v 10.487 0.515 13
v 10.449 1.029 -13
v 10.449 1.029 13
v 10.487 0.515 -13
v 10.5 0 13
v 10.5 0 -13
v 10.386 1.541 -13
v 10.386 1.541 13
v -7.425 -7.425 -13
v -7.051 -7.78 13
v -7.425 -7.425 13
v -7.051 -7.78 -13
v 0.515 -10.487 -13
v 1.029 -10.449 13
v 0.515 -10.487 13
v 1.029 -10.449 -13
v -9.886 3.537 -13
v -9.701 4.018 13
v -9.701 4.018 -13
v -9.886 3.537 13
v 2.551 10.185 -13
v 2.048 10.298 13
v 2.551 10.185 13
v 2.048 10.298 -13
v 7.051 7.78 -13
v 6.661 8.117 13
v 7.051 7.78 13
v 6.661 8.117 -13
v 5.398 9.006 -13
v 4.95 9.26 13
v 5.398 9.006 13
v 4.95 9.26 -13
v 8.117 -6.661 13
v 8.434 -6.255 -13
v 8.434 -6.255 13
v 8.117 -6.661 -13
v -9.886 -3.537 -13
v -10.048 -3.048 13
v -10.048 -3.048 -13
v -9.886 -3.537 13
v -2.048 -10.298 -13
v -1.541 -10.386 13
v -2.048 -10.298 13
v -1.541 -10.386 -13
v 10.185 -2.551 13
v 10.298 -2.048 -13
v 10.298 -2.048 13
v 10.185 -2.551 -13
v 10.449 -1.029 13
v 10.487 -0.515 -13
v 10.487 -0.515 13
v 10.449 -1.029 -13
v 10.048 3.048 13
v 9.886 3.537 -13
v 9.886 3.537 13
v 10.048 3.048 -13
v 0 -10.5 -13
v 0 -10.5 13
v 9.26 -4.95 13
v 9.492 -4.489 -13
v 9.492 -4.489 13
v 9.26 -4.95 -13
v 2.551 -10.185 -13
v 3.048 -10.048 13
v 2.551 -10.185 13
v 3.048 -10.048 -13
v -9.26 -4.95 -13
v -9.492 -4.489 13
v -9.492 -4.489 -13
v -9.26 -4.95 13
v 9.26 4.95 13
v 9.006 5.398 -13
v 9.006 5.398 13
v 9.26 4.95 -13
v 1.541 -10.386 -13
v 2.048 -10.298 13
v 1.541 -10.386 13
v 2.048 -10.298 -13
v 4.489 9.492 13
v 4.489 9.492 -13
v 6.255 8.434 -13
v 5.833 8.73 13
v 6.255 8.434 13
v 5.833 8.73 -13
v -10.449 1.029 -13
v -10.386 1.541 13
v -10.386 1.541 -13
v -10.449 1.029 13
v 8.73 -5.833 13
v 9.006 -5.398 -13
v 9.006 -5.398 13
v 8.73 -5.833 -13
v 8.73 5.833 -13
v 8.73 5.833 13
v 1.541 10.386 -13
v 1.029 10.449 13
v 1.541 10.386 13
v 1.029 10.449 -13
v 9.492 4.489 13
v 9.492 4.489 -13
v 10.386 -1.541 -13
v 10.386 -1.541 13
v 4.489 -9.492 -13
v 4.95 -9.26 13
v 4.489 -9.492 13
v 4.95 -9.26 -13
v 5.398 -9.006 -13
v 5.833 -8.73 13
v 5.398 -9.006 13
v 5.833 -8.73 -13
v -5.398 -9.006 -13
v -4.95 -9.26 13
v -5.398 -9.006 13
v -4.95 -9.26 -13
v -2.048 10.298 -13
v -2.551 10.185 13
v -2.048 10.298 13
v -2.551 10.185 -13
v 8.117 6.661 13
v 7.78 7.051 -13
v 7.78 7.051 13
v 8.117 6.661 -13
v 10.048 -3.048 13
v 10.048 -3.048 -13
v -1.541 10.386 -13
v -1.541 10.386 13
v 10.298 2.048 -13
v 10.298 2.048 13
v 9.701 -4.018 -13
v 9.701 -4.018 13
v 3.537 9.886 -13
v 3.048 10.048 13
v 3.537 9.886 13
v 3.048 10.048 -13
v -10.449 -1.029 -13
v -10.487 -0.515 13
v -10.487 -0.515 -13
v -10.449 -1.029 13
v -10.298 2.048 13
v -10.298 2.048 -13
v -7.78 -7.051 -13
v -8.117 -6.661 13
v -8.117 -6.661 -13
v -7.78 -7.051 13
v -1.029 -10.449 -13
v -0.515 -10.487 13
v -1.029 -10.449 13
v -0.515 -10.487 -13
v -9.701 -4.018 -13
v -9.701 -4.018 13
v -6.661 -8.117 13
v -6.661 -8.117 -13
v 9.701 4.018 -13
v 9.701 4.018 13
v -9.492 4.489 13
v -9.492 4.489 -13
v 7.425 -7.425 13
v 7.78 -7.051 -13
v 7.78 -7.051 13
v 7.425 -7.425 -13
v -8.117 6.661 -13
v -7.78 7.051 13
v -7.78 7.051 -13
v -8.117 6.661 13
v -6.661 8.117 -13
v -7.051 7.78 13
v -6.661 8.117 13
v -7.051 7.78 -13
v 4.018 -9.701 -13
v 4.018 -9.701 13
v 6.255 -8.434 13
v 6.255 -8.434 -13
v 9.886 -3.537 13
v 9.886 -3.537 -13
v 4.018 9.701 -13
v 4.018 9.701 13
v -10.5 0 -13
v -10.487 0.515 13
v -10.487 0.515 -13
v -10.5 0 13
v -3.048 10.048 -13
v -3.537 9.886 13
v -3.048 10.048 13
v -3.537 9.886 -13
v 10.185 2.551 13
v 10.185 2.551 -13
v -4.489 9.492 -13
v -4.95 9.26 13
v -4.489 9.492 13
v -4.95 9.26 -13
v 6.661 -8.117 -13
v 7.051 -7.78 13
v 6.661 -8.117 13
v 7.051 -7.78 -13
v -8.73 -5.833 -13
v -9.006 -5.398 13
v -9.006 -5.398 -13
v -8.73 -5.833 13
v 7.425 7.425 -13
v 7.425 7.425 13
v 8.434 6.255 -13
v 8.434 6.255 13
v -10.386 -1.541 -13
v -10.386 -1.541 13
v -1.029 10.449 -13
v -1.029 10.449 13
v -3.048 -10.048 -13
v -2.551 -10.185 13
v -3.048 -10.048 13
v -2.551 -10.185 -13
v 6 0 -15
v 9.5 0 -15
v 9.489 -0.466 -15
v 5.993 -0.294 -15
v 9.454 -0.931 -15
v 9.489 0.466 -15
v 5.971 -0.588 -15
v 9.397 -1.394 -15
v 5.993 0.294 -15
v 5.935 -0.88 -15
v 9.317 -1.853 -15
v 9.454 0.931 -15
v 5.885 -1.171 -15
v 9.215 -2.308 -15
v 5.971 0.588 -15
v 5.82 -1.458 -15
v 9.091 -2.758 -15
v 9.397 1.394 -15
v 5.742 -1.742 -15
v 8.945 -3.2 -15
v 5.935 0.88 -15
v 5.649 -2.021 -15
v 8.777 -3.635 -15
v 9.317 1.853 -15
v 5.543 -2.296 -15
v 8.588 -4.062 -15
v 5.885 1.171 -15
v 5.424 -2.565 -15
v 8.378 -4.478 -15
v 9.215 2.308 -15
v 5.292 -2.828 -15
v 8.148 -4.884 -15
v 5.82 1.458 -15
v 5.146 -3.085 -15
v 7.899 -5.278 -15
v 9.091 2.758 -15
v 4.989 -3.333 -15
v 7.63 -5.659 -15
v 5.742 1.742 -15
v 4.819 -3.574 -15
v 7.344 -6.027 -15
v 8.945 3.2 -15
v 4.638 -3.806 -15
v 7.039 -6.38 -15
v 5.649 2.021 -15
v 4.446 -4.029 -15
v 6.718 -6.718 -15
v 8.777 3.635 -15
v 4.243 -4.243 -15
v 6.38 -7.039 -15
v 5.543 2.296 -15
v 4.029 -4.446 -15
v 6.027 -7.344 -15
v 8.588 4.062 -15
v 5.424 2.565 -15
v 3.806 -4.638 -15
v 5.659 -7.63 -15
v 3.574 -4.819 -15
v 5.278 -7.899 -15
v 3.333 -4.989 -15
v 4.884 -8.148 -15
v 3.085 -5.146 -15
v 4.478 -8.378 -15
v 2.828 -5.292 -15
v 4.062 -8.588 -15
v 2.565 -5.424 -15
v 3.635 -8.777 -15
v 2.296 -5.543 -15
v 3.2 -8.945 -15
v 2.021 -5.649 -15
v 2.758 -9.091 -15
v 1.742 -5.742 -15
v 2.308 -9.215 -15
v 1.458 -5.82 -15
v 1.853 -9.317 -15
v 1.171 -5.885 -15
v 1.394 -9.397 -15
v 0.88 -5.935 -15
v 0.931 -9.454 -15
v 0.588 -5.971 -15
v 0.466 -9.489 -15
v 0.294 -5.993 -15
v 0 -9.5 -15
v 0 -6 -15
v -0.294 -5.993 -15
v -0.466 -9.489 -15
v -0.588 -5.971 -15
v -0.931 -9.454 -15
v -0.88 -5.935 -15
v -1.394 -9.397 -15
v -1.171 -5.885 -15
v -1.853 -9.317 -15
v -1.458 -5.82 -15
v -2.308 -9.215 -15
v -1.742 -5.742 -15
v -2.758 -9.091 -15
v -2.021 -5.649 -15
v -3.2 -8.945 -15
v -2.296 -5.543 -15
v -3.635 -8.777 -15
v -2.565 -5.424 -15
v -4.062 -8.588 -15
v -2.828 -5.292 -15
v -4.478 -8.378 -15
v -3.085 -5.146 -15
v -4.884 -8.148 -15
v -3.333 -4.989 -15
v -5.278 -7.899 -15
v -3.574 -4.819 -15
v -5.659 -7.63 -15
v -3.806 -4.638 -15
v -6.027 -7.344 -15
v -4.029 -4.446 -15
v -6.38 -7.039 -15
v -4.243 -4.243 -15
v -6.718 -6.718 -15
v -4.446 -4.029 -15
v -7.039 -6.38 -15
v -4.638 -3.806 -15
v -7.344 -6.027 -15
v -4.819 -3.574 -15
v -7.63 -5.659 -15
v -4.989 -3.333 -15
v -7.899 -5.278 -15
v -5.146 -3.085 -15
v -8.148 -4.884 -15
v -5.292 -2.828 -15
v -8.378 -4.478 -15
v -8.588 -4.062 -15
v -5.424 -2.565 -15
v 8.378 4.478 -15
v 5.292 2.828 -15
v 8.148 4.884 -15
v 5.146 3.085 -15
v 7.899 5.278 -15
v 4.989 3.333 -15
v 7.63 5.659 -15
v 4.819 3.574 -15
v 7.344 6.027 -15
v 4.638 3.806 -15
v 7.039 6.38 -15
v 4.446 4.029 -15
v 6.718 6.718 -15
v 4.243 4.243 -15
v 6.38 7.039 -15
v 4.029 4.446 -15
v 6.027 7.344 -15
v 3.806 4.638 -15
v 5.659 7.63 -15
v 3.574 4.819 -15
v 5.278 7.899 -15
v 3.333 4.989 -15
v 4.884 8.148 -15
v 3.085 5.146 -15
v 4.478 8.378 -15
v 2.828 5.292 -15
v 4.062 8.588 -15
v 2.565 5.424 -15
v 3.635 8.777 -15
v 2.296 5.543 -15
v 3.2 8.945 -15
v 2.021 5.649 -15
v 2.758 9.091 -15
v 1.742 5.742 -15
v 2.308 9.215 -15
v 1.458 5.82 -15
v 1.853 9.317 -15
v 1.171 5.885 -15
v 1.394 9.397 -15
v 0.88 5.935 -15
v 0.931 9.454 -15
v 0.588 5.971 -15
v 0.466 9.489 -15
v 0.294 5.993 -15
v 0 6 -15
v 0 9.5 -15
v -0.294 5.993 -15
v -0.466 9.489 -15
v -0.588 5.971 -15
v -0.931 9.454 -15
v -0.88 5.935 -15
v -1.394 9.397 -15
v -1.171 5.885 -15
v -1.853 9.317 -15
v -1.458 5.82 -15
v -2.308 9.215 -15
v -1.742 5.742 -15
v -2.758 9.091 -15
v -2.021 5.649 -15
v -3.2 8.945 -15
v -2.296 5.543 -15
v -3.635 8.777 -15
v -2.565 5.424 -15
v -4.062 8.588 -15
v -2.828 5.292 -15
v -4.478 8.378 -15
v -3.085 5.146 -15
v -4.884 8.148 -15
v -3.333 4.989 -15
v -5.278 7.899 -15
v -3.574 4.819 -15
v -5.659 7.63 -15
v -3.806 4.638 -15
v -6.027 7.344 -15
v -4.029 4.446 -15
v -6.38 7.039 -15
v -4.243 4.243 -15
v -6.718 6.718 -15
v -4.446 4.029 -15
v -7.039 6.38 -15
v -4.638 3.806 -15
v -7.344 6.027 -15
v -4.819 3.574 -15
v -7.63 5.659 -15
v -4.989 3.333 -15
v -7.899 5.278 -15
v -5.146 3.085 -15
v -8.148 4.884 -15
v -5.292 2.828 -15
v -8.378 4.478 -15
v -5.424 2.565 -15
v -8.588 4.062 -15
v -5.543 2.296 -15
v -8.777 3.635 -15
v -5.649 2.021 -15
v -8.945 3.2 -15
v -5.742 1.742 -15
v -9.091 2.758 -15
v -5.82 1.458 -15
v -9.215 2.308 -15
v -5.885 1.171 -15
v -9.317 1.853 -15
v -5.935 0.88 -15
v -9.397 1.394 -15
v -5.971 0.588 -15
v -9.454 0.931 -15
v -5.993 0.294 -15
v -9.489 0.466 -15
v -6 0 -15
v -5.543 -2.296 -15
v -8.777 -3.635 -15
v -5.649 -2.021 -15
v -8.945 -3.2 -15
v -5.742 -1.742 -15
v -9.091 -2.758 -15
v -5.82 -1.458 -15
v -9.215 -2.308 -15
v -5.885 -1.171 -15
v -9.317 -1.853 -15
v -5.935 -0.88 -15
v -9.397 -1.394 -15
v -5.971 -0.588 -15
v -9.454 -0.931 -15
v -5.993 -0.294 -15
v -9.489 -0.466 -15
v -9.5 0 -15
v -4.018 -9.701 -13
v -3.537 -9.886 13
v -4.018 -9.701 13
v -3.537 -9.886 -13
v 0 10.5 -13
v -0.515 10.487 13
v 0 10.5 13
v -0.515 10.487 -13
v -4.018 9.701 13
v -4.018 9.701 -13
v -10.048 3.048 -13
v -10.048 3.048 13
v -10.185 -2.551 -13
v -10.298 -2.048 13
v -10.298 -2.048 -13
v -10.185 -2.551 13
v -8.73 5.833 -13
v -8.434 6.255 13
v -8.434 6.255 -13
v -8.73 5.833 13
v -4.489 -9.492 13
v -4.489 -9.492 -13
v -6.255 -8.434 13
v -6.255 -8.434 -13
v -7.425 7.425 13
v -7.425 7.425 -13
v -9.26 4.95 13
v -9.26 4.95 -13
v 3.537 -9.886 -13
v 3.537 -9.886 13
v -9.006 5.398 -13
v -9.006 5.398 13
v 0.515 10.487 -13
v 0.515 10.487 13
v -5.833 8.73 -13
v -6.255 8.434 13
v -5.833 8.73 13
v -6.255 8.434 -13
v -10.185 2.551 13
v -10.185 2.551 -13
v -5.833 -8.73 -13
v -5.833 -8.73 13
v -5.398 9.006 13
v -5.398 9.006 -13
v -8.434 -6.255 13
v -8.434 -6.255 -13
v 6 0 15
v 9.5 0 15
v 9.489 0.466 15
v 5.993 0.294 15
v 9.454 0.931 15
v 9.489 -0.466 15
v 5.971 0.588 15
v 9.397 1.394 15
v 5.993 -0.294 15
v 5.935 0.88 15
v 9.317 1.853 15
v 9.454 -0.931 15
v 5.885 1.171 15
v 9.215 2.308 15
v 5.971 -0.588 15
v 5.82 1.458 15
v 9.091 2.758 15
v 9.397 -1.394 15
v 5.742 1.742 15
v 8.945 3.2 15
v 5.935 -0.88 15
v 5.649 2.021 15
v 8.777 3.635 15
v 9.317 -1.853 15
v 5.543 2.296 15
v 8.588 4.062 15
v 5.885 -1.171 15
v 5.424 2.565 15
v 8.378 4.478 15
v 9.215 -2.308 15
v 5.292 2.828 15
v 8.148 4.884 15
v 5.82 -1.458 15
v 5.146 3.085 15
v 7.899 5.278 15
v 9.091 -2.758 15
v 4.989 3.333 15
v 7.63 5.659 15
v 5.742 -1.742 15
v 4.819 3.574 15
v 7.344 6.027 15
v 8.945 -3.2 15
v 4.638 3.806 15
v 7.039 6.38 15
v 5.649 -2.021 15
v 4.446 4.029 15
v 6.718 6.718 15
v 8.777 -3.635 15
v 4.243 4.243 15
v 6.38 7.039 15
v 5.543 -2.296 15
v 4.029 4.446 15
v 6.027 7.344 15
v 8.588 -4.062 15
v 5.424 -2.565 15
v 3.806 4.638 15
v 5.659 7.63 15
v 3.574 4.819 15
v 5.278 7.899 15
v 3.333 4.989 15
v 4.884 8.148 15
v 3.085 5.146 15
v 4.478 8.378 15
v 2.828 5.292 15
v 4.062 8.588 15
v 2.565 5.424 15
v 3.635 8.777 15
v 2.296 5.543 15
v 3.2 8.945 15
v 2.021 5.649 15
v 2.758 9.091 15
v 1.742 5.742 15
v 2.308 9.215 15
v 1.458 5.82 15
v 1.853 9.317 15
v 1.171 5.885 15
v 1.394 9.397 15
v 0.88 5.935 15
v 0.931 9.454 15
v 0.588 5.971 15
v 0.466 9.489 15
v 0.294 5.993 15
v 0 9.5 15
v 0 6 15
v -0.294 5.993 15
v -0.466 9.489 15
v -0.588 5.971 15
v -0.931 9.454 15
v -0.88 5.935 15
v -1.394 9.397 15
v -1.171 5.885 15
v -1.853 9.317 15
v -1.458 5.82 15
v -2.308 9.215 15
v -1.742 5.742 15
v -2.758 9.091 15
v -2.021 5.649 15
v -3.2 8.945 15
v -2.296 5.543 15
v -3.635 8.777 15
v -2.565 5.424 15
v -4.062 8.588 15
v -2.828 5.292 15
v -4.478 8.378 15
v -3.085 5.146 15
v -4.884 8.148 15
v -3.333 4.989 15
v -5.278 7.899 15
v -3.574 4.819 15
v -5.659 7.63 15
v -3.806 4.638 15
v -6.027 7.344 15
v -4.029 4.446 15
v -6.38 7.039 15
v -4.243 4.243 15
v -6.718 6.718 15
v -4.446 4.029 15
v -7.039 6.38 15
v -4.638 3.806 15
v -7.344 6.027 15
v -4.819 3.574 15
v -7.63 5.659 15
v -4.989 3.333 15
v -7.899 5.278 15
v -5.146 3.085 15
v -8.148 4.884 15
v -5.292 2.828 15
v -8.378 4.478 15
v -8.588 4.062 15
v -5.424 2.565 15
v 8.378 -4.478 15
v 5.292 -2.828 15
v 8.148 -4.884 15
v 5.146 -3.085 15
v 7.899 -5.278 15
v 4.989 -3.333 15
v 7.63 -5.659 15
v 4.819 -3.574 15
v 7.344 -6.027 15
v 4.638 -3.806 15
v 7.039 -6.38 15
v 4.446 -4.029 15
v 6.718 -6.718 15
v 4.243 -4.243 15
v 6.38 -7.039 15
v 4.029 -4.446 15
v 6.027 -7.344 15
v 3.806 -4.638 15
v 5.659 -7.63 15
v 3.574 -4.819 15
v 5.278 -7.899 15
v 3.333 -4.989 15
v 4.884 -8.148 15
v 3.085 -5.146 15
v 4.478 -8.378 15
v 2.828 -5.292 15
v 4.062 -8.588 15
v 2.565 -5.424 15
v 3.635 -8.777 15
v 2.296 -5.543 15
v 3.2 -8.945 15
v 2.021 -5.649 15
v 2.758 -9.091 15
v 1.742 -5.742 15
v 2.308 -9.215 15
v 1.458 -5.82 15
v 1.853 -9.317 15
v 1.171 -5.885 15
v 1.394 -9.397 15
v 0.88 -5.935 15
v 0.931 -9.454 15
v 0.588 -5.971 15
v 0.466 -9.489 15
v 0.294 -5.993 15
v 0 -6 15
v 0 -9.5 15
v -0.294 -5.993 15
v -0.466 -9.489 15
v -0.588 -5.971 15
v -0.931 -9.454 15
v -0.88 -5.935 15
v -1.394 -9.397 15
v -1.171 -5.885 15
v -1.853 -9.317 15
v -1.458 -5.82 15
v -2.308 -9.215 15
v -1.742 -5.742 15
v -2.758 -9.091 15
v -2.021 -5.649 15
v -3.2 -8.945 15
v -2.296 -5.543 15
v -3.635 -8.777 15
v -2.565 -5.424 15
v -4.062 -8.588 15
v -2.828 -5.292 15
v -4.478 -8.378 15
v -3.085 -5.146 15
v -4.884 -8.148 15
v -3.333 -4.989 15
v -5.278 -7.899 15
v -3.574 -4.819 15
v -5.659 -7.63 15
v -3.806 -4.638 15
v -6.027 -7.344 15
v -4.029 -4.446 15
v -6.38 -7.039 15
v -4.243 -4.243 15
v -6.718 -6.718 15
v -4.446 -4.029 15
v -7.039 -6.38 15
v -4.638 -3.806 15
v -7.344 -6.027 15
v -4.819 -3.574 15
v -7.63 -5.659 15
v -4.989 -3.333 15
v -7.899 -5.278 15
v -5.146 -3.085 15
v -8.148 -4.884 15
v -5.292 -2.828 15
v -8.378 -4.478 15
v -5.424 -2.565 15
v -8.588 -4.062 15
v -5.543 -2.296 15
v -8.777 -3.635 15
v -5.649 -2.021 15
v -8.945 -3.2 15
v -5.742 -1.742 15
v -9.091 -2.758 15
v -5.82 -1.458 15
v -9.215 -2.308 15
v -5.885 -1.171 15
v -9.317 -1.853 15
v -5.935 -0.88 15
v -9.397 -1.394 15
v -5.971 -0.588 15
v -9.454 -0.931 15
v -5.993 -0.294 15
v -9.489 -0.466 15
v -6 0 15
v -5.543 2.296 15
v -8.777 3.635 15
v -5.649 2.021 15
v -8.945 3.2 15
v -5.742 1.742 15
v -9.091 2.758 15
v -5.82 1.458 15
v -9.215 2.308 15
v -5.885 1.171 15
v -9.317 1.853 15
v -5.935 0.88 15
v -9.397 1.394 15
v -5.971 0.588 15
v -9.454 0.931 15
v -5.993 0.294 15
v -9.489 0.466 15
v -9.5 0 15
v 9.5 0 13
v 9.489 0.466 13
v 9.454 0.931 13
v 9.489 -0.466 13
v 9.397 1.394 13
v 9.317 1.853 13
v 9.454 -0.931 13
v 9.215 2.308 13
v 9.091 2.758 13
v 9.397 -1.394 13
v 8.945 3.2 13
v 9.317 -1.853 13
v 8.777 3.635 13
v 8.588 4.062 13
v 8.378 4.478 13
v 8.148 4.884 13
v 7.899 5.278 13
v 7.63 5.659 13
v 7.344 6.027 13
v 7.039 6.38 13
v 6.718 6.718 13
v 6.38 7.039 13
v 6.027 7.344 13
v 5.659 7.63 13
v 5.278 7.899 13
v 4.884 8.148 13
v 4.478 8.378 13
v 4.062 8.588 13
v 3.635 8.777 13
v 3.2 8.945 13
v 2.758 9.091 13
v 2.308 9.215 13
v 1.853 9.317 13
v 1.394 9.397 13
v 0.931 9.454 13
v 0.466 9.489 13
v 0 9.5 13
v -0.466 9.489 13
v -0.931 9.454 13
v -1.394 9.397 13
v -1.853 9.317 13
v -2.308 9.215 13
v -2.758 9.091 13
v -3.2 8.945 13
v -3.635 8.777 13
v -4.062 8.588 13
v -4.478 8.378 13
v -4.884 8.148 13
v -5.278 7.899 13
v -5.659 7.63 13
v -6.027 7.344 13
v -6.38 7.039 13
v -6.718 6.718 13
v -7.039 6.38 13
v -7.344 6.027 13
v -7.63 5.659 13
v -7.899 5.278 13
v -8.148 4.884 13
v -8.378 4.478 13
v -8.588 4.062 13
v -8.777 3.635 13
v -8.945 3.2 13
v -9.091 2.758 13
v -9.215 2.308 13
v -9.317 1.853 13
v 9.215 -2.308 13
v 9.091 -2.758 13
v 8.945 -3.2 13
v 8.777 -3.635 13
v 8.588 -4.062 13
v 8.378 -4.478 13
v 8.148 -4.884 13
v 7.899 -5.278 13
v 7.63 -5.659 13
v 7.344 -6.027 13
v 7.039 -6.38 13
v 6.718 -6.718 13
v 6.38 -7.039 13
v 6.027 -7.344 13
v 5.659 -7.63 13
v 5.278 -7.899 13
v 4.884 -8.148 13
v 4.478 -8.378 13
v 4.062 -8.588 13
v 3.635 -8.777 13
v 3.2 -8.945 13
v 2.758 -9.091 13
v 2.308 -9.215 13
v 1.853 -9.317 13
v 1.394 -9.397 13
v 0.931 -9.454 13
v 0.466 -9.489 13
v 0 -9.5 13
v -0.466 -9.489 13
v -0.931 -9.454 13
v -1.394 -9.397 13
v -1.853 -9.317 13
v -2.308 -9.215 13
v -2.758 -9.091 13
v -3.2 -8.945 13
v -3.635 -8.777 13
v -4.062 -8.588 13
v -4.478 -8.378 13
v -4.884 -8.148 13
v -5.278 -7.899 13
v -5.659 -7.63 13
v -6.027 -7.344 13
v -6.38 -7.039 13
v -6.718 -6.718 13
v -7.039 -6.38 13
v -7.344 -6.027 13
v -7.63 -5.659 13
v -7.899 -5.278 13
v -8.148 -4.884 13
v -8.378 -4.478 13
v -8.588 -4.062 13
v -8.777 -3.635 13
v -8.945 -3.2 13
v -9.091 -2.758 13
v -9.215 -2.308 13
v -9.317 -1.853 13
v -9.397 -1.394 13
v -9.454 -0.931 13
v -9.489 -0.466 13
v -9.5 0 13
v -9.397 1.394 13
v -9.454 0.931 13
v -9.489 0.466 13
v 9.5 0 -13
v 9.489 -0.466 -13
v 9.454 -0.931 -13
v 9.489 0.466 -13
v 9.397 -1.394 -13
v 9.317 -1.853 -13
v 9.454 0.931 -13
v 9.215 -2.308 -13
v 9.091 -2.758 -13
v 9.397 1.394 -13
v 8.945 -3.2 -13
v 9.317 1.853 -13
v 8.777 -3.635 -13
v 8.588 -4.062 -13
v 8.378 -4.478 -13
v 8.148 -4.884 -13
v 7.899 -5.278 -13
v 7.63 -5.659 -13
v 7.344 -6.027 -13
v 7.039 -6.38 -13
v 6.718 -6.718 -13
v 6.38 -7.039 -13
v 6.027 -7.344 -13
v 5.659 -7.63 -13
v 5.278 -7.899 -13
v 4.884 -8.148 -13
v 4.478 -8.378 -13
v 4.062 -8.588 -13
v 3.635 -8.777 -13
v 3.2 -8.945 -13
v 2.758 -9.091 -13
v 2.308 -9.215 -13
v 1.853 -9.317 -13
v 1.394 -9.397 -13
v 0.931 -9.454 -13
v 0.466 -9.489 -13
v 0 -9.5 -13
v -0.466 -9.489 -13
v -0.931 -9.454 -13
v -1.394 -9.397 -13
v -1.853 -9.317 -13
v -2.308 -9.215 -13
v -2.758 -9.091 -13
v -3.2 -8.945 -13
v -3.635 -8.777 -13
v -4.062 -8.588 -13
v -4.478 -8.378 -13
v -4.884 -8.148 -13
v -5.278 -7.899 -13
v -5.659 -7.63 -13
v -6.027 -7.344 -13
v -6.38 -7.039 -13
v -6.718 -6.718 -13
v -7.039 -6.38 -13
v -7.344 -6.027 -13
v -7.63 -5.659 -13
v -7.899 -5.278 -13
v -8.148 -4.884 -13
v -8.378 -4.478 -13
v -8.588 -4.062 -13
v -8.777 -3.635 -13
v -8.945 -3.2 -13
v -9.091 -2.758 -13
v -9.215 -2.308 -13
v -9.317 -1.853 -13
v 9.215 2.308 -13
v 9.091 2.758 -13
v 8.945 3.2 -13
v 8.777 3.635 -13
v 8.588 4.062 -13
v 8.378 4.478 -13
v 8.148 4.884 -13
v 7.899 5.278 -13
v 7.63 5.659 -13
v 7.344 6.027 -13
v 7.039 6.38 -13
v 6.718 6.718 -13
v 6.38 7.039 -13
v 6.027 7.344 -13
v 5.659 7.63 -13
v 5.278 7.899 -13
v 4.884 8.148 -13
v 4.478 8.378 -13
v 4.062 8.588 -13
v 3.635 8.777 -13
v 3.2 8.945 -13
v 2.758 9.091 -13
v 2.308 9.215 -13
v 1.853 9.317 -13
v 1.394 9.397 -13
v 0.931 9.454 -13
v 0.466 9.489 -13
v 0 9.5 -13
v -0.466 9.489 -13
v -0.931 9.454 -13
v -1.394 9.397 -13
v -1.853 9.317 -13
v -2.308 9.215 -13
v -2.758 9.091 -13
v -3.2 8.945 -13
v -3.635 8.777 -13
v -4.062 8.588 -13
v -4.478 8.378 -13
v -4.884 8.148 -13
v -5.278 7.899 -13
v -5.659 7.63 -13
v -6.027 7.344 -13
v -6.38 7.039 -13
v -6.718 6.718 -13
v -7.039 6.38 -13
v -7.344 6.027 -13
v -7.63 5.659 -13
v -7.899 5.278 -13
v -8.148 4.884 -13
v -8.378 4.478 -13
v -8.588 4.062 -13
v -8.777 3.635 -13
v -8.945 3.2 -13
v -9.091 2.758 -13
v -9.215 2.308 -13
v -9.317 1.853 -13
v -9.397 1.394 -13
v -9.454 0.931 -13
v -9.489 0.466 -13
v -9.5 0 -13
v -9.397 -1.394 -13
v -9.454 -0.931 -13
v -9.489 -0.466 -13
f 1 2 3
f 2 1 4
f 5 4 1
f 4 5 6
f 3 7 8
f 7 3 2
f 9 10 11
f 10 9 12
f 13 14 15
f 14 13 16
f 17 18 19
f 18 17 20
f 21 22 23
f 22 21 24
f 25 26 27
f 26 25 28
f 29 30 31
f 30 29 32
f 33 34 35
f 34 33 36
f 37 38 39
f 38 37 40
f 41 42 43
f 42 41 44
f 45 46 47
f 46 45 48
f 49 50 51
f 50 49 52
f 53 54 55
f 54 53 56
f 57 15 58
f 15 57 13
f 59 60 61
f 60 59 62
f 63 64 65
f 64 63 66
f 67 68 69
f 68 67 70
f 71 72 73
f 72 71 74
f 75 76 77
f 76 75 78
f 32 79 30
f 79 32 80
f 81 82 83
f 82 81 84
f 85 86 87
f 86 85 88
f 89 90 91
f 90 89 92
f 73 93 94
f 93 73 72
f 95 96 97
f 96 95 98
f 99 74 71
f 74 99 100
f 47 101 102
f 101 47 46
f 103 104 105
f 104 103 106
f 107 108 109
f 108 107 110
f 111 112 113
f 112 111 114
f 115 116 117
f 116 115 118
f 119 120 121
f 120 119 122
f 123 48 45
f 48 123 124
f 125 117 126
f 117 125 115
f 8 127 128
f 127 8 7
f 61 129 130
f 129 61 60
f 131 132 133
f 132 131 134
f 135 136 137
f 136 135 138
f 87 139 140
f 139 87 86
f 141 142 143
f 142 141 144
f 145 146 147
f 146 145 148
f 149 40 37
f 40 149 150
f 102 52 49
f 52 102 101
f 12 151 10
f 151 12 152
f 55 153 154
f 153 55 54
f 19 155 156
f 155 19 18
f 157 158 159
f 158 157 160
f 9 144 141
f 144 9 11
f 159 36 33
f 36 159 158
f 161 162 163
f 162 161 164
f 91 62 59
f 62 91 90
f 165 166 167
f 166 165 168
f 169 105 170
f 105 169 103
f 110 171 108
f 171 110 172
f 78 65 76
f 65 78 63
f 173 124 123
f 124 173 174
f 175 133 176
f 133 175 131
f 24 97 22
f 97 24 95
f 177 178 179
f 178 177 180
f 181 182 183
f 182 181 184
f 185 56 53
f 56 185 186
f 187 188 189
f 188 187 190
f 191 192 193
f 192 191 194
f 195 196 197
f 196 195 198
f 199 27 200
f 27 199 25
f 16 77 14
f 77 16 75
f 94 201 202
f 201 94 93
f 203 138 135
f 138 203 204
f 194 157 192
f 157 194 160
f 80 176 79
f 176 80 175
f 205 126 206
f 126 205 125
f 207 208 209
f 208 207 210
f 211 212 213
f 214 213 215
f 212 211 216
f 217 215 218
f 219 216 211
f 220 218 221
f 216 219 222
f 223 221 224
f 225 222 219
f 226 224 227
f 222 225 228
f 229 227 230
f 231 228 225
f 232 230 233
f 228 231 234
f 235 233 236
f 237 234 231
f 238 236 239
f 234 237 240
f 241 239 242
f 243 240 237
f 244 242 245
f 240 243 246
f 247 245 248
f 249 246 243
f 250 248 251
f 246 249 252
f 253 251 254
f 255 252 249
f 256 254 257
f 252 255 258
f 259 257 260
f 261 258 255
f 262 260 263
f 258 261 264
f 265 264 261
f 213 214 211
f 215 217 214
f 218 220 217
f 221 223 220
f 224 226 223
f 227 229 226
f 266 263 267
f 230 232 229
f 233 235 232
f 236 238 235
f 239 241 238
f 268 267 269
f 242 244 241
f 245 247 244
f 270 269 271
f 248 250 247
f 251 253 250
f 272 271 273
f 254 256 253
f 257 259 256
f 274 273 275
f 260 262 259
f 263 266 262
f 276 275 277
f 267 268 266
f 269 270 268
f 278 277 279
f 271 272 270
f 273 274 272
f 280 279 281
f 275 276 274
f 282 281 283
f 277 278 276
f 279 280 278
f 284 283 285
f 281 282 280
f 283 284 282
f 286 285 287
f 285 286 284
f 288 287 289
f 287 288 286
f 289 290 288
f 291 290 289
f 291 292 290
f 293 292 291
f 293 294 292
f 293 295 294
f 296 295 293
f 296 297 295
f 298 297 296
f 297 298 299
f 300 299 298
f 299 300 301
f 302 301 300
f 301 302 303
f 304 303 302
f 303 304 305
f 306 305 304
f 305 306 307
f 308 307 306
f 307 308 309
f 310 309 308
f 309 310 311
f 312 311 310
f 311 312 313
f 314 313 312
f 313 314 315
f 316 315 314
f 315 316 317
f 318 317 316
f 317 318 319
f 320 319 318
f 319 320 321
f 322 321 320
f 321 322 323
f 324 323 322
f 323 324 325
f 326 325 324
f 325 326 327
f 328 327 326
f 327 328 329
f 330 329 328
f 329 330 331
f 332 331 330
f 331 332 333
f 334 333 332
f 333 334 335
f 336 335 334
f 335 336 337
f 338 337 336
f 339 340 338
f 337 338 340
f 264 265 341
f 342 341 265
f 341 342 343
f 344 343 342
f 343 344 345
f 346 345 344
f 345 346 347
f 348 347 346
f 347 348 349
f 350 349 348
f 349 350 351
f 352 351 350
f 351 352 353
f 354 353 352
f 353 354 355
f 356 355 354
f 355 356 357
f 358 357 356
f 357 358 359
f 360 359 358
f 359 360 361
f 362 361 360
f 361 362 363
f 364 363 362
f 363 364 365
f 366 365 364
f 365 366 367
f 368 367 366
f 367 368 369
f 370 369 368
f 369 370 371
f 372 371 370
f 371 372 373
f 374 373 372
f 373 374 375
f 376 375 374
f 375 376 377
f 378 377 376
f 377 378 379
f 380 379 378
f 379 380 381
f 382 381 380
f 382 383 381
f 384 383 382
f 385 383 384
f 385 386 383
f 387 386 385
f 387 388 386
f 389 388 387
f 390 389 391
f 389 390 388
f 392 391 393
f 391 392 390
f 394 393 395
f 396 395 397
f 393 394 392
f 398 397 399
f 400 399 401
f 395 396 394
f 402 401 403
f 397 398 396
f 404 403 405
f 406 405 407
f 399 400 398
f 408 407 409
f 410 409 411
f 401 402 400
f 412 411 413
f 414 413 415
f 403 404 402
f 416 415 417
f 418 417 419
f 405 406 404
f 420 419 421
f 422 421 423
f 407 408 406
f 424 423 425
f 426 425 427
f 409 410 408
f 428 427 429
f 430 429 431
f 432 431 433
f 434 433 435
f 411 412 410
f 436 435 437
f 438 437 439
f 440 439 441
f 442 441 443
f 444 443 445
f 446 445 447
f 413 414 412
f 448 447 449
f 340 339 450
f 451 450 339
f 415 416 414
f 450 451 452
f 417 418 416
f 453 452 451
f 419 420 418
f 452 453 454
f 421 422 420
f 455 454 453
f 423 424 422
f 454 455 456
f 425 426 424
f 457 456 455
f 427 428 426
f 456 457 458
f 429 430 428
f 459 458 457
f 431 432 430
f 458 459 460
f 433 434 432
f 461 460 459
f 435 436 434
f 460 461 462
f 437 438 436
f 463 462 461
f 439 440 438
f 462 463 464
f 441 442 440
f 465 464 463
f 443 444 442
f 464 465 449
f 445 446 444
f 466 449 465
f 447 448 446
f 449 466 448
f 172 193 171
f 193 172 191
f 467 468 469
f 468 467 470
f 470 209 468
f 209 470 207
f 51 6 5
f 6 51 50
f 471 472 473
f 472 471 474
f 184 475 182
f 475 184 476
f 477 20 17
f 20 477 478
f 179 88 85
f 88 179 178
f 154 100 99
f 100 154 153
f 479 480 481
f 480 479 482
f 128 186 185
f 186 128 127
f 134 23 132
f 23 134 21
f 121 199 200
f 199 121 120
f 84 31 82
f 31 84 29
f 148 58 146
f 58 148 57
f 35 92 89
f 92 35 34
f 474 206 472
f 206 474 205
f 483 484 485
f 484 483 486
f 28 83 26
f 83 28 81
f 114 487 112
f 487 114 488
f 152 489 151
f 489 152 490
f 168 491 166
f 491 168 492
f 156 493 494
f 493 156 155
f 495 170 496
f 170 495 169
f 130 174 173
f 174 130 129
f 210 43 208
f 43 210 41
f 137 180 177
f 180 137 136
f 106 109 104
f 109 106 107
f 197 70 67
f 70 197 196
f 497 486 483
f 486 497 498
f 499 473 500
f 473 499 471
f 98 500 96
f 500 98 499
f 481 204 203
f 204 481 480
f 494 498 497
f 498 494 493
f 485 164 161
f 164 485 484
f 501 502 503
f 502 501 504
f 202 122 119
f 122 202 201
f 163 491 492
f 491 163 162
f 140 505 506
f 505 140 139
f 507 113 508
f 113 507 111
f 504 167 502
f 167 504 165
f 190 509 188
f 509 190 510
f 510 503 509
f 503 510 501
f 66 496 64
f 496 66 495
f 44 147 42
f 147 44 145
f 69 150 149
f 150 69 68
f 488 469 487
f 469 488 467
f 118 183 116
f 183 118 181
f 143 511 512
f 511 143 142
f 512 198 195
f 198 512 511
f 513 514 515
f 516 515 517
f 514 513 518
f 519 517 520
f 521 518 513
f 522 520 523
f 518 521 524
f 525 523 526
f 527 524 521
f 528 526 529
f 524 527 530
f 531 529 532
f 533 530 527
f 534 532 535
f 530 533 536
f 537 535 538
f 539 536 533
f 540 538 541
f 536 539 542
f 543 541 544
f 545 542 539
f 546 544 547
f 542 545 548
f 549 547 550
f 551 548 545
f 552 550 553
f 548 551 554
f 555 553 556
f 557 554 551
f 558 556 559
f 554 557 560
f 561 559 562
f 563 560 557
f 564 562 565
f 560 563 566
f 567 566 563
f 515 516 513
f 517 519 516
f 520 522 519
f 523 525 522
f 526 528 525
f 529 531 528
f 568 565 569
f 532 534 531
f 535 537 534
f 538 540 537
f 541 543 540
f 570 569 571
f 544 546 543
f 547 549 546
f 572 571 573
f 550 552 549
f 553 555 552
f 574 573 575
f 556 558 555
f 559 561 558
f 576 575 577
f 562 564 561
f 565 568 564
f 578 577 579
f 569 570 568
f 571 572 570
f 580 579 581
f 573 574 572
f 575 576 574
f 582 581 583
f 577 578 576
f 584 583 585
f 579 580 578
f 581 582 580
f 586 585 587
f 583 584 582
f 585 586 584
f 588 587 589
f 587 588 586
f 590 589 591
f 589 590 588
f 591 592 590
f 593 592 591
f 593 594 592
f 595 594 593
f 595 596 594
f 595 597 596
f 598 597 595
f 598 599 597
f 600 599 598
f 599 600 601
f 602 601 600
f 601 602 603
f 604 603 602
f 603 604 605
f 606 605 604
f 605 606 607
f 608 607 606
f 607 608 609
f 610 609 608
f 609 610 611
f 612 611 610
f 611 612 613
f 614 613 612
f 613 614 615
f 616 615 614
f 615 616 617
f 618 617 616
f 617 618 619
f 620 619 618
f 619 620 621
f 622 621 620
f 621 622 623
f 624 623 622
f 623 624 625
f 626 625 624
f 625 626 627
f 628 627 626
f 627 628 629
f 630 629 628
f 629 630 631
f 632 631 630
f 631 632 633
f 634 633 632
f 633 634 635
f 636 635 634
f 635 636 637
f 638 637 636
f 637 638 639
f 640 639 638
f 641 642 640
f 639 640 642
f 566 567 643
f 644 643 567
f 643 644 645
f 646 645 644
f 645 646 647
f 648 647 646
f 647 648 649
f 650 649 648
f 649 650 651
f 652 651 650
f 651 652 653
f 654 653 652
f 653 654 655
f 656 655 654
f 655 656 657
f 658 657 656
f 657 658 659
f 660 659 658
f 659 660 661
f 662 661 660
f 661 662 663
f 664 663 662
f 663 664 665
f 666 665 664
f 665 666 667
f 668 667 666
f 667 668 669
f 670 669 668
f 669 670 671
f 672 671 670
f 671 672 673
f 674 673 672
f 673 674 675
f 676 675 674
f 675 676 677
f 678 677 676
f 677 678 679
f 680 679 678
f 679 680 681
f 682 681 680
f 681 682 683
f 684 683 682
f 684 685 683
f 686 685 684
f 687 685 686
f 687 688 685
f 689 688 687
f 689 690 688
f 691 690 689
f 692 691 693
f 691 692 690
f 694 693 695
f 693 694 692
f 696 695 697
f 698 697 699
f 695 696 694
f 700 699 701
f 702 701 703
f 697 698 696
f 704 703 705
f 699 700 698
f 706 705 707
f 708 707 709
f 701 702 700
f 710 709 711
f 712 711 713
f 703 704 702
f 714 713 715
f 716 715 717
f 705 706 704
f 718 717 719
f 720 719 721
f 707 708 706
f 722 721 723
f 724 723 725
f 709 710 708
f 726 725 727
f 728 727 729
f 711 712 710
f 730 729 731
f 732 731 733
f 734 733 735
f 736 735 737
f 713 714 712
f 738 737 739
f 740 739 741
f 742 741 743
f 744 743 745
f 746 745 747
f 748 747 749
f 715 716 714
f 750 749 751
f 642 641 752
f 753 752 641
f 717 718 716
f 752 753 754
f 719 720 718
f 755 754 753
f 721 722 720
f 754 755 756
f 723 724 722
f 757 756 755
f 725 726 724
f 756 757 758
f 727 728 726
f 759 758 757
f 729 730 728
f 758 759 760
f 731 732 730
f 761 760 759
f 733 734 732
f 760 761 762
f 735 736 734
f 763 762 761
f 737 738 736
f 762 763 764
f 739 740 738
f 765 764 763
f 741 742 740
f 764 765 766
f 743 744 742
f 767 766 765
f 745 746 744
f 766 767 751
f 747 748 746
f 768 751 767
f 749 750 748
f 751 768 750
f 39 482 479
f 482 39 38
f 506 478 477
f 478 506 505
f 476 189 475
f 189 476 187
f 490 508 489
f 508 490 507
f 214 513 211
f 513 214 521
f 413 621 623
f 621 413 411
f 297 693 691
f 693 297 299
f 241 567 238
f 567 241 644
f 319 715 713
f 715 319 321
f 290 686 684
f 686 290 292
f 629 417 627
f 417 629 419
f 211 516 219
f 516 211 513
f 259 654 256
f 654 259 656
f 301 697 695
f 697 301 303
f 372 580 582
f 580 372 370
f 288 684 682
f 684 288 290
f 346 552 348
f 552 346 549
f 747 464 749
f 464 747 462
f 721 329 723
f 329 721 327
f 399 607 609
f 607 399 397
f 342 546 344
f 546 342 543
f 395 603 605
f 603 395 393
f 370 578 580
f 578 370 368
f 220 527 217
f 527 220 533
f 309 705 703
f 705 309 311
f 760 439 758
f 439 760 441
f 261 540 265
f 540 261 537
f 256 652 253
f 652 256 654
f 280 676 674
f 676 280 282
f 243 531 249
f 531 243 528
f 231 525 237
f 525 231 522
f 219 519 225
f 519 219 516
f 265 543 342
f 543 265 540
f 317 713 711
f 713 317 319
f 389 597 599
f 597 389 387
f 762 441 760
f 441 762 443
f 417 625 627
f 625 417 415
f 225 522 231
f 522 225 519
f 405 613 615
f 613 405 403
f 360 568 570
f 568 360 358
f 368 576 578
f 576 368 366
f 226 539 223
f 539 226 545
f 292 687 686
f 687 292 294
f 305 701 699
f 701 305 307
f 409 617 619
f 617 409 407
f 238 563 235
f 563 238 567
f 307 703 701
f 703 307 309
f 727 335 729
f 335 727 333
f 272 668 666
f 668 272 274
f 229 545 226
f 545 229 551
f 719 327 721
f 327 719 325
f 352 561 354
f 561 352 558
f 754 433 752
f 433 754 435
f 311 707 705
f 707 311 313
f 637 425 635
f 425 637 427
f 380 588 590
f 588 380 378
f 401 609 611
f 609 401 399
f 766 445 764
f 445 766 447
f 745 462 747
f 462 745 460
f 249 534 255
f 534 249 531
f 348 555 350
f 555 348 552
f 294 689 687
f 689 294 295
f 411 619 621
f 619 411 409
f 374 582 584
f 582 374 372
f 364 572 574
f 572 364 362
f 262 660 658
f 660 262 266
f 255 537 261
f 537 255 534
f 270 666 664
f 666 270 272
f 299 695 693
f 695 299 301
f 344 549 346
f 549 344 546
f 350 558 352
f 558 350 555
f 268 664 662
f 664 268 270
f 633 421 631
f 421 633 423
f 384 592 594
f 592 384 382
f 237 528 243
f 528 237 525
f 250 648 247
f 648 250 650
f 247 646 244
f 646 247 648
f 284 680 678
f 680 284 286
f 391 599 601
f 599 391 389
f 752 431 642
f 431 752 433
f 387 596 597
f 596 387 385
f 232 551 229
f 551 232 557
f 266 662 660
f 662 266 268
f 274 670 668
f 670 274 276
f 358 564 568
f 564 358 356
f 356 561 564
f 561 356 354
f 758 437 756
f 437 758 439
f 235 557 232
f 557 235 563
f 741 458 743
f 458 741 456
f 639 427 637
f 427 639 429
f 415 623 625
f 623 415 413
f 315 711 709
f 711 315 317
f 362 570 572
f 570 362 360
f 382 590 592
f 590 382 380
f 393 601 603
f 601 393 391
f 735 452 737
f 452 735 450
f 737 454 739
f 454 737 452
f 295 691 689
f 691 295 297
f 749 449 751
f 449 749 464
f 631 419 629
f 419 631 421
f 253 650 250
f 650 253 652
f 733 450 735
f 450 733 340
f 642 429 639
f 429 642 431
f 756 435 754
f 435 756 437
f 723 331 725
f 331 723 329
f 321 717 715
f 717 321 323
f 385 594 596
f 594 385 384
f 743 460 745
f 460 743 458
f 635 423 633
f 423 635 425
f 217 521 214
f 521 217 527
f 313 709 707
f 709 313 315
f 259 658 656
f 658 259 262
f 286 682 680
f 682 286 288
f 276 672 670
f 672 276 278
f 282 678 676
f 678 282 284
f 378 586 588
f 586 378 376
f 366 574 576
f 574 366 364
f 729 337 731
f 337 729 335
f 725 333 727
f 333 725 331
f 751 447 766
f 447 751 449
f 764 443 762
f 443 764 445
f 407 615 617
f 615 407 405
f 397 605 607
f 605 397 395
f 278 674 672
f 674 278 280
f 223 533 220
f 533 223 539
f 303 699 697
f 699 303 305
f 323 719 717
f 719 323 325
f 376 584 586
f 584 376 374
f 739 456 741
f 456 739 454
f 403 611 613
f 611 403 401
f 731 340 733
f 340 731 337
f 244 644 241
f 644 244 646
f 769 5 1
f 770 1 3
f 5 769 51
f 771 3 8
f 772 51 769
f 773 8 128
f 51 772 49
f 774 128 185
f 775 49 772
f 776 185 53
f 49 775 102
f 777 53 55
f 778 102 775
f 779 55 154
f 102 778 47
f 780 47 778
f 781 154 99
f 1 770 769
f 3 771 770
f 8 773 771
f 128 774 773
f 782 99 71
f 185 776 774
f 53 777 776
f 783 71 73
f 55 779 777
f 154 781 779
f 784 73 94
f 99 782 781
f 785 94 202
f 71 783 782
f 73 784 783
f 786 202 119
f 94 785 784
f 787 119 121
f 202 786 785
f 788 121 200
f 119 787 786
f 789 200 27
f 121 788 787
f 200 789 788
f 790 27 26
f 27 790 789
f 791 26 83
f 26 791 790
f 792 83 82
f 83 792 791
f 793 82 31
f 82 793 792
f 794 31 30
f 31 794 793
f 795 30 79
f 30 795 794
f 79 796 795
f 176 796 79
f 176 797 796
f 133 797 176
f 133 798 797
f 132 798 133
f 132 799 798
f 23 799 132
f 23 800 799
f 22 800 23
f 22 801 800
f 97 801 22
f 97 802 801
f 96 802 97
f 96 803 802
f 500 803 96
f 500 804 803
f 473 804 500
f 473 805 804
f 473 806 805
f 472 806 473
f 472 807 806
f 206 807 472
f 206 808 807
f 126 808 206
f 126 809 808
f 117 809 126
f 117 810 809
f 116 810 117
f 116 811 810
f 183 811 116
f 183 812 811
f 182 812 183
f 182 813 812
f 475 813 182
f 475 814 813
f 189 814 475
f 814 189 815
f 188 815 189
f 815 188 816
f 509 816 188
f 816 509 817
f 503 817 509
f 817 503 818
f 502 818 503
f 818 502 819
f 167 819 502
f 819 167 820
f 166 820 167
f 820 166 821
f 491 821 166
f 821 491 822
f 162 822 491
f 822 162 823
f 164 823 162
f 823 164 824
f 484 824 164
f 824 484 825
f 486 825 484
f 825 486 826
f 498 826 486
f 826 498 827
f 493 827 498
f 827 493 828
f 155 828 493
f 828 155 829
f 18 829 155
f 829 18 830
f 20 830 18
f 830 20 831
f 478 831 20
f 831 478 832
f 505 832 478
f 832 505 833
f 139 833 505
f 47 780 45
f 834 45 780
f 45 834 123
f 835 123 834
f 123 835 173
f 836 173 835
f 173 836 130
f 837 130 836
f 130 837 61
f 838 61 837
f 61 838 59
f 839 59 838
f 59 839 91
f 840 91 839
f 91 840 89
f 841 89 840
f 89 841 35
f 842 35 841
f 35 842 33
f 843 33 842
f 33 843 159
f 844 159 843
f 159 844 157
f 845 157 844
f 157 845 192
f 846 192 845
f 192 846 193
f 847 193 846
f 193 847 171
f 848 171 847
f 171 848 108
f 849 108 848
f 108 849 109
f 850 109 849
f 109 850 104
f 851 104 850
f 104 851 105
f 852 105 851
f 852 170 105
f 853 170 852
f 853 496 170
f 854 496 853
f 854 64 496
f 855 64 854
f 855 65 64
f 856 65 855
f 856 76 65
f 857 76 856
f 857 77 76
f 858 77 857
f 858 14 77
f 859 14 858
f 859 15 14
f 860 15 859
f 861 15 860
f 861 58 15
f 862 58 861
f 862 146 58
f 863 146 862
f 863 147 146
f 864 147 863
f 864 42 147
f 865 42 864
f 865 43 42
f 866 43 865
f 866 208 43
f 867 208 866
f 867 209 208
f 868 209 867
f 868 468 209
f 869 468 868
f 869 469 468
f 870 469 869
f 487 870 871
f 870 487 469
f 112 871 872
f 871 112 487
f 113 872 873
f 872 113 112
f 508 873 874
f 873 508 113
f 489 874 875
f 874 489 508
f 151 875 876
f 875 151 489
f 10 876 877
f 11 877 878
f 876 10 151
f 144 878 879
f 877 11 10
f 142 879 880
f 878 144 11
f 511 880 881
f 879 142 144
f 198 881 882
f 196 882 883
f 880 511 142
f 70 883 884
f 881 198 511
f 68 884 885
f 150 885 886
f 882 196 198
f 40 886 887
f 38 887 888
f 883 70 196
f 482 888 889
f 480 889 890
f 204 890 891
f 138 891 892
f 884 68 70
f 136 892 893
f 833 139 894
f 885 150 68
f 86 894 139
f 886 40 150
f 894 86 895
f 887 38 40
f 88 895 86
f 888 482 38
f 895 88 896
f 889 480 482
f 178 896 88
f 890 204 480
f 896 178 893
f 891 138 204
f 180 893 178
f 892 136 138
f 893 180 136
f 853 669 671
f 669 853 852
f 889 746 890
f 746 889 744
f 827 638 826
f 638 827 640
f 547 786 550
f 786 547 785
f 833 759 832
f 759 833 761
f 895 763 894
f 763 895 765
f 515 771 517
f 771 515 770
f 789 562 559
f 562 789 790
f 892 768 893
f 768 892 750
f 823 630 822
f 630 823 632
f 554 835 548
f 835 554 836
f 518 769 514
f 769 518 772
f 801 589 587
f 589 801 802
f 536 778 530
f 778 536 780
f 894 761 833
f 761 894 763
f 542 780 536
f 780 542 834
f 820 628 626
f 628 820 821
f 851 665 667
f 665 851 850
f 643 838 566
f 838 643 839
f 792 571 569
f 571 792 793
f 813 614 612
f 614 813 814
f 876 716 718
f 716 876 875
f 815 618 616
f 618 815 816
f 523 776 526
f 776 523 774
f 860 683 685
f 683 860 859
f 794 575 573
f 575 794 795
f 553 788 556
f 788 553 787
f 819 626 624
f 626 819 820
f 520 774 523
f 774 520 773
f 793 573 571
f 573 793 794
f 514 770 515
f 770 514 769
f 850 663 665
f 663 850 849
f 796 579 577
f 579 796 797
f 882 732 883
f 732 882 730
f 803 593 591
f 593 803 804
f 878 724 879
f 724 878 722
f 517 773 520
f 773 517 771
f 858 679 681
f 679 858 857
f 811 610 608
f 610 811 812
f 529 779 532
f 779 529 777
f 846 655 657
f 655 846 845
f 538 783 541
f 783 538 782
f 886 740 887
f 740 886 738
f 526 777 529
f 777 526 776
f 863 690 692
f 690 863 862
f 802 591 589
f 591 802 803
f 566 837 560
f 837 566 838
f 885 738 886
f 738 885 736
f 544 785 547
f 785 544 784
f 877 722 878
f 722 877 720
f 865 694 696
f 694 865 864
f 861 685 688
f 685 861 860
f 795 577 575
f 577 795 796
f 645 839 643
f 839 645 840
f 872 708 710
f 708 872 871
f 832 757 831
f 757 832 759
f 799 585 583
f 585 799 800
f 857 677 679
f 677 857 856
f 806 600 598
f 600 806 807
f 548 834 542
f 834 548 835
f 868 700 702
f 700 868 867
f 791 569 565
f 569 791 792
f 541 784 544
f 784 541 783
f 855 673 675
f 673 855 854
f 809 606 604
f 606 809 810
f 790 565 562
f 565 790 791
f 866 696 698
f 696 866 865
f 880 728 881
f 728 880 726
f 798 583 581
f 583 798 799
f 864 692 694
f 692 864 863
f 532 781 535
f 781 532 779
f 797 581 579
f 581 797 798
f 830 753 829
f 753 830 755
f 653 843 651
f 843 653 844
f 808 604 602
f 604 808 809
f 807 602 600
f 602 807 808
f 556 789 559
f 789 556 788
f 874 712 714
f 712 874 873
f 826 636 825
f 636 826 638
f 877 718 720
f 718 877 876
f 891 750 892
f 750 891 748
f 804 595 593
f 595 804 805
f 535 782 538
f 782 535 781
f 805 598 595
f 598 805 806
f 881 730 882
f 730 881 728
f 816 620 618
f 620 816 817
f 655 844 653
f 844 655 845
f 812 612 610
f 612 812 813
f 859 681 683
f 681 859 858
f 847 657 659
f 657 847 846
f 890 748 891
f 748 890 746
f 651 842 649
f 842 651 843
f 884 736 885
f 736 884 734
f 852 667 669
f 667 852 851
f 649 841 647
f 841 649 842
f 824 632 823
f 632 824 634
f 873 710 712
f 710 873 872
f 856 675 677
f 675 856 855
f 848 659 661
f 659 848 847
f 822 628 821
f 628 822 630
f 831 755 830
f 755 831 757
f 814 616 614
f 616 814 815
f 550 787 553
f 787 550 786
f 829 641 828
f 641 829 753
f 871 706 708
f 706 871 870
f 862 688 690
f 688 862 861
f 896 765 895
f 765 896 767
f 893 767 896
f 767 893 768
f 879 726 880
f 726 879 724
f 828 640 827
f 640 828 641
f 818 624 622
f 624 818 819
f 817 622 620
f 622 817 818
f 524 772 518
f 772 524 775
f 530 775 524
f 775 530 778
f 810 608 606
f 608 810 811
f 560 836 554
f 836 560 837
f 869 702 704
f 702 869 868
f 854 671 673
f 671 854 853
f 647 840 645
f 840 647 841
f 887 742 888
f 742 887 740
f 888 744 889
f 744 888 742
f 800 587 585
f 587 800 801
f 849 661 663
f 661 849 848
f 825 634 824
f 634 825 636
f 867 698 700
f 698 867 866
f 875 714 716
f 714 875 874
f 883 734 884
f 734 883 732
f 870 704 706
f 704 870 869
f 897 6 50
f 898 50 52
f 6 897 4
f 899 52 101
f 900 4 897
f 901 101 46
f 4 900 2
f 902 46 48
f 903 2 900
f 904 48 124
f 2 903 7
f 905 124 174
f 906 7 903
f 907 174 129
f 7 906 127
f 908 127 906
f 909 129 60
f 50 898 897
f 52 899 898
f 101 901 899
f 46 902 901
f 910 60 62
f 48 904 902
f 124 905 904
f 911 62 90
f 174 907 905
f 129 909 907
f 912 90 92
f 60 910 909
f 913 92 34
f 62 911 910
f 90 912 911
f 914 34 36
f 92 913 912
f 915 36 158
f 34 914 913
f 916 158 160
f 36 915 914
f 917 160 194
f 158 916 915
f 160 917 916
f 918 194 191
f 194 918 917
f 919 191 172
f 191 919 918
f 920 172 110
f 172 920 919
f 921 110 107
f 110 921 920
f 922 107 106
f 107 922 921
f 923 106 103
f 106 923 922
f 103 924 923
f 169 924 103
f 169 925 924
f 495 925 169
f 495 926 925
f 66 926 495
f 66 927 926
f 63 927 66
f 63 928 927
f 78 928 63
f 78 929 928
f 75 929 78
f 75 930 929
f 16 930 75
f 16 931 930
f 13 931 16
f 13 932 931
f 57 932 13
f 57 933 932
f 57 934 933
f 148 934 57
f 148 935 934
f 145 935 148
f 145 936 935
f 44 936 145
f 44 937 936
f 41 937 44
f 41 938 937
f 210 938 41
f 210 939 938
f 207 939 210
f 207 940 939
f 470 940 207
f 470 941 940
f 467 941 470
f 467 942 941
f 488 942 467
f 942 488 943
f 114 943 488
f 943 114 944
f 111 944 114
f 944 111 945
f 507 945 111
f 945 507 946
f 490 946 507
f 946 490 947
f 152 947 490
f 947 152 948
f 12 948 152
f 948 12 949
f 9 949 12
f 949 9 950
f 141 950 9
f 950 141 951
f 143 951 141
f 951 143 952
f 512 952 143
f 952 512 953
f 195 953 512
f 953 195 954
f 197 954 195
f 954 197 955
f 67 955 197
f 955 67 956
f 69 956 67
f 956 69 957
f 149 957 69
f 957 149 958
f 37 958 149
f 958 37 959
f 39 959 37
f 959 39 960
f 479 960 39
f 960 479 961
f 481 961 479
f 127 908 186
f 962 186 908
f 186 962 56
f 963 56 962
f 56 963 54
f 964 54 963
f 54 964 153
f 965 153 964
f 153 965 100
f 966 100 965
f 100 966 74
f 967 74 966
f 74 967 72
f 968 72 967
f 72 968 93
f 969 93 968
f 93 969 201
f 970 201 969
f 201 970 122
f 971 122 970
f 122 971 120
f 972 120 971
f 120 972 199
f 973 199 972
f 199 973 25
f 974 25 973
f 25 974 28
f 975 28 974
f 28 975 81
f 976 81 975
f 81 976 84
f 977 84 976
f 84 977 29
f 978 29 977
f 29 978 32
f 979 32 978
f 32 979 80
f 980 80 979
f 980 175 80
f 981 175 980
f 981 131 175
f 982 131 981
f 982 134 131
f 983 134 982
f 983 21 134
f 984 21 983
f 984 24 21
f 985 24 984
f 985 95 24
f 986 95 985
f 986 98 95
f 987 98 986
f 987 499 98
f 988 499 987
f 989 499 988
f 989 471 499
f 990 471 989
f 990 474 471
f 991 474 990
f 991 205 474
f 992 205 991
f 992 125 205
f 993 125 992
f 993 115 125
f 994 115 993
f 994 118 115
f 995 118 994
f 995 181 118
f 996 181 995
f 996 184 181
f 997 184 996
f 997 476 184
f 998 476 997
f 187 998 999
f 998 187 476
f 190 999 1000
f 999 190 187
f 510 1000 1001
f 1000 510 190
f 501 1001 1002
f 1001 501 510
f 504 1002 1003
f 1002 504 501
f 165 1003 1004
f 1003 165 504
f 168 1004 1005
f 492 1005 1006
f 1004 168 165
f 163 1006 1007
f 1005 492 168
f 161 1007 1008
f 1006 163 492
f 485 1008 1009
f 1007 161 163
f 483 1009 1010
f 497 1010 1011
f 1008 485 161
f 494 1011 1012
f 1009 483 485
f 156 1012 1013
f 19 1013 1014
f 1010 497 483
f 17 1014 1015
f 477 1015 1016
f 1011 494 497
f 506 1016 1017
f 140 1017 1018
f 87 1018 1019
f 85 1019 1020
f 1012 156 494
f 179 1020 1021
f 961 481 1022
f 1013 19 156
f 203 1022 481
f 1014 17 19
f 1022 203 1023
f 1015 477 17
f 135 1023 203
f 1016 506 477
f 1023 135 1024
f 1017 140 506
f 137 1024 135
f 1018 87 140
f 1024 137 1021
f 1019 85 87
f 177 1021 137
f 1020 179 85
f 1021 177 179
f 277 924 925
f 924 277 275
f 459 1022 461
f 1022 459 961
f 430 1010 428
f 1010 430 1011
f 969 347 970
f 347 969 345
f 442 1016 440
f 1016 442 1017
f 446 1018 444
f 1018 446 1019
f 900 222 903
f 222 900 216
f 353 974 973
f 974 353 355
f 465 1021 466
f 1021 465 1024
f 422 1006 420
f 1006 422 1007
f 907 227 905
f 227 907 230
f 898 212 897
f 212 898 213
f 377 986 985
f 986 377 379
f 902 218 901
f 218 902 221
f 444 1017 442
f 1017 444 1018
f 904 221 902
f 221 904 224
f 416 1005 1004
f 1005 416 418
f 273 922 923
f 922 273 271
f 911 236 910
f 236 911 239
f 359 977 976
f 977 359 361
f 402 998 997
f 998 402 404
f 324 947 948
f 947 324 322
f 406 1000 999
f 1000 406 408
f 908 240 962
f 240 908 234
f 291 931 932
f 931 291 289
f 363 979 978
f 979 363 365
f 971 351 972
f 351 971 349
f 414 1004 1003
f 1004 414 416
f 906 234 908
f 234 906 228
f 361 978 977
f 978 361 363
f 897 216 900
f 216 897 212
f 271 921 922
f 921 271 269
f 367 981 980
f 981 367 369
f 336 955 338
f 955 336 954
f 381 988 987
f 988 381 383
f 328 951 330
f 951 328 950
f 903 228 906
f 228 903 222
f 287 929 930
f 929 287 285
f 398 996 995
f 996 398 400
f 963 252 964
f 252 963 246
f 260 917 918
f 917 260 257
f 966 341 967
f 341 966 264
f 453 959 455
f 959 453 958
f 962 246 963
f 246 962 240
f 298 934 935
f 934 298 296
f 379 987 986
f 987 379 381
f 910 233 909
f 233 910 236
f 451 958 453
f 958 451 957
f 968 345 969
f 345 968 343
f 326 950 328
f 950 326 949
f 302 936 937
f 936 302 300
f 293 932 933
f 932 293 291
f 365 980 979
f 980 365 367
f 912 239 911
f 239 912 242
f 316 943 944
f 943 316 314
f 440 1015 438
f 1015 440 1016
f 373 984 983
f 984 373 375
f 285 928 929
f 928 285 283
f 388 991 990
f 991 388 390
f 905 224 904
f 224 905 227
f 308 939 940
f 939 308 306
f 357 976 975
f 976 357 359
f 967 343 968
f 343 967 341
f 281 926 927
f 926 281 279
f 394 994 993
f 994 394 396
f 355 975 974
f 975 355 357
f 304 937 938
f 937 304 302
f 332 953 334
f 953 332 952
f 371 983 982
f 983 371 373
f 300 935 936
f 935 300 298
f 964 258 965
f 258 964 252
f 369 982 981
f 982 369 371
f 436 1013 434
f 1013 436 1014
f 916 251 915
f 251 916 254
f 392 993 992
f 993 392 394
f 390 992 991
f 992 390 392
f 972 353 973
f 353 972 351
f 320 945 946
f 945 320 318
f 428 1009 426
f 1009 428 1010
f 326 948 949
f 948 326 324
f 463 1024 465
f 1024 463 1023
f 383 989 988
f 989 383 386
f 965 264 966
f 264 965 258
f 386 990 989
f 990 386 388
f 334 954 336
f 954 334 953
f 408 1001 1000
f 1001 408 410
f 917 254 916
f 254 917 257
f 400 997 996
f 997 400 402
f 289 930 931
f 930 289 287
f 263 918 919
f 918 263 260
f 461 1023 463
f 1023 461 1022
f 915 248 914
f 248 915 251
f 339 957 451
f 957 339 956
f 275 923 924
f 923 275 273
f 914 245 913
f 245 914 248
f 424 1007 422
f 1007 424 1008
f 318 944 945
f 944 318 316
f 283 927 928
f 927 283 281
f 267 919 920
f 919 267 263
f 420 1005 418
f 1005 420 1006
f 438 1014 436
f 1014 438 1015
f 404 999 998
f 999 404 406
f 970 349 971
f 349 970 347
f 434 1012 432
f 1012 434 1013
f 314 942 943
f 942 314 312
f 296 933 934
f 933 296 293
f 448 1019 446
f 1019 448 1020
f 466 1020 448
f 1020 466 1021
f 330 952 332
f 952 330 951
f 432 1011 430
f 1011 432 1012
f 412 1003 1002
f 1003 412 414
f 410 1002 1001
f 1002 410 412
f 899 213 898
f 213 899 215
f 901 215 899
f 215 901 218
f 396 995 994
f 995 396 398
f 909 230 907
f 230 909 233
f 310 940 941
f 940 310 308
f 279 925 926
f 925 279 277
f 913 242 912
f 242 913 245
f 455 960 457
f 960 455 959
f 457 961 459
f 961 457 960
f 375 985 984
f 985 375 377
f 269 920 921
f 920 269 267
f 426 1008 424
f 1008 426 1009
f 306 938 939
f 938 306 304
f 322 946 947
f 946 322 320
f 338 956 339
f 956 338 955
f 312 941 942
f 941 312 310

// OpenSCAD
$fn=128;

bore_d = 12.0;
od_d = 21.0;
len = 30.0;

seal_recess_depth = 1.0;
seal_recess_len = 2.0;
chamfer_len = 0.8;

module chamfered_ring(od, id, h, chamfer=0.8) {
    difference() {
        union() {
            cylinder(d=od, h=h, center=true);
            translate([0,0,h/2 - chamfer/2])
                cylinder(d1=od, d2=od-2*chamfer, h=chamfer, center=true);
            translate([0,0,-h/2 + chamfer/2])
                cylinder(d1=od-2*chamfer, d2=od, h=chamfer, center=true);
        }
        cylinder(d=id, h=h+2, center=true);
    }
}

module linear_bearing(bore, od, L) {
    difference() {
        chamfered_ring(od=od, id=bore, h=L, chamfer=chamfer_len);

        translate([0,0, L/2 - seal_recess_len/2])
            difference() {
                cylinder(d=od+2, h=seal_recess_len, center=true);
                cylinder(d=od-2*seal_recess_depth, h=seal_recess_len+2, center=true);
            }

        translate([0,0,-L/2 + seal_recess_len/2])
            difference() {
                cylinder(d=od+2, h=seal_recess_len, center=true);
                cylinder(d=od-2*seal_recess_depth, h=seal_recess_len+2, center=true);
            }
    }
}

linear_bearing(bore=bore_d, od=od_d, L=len);
